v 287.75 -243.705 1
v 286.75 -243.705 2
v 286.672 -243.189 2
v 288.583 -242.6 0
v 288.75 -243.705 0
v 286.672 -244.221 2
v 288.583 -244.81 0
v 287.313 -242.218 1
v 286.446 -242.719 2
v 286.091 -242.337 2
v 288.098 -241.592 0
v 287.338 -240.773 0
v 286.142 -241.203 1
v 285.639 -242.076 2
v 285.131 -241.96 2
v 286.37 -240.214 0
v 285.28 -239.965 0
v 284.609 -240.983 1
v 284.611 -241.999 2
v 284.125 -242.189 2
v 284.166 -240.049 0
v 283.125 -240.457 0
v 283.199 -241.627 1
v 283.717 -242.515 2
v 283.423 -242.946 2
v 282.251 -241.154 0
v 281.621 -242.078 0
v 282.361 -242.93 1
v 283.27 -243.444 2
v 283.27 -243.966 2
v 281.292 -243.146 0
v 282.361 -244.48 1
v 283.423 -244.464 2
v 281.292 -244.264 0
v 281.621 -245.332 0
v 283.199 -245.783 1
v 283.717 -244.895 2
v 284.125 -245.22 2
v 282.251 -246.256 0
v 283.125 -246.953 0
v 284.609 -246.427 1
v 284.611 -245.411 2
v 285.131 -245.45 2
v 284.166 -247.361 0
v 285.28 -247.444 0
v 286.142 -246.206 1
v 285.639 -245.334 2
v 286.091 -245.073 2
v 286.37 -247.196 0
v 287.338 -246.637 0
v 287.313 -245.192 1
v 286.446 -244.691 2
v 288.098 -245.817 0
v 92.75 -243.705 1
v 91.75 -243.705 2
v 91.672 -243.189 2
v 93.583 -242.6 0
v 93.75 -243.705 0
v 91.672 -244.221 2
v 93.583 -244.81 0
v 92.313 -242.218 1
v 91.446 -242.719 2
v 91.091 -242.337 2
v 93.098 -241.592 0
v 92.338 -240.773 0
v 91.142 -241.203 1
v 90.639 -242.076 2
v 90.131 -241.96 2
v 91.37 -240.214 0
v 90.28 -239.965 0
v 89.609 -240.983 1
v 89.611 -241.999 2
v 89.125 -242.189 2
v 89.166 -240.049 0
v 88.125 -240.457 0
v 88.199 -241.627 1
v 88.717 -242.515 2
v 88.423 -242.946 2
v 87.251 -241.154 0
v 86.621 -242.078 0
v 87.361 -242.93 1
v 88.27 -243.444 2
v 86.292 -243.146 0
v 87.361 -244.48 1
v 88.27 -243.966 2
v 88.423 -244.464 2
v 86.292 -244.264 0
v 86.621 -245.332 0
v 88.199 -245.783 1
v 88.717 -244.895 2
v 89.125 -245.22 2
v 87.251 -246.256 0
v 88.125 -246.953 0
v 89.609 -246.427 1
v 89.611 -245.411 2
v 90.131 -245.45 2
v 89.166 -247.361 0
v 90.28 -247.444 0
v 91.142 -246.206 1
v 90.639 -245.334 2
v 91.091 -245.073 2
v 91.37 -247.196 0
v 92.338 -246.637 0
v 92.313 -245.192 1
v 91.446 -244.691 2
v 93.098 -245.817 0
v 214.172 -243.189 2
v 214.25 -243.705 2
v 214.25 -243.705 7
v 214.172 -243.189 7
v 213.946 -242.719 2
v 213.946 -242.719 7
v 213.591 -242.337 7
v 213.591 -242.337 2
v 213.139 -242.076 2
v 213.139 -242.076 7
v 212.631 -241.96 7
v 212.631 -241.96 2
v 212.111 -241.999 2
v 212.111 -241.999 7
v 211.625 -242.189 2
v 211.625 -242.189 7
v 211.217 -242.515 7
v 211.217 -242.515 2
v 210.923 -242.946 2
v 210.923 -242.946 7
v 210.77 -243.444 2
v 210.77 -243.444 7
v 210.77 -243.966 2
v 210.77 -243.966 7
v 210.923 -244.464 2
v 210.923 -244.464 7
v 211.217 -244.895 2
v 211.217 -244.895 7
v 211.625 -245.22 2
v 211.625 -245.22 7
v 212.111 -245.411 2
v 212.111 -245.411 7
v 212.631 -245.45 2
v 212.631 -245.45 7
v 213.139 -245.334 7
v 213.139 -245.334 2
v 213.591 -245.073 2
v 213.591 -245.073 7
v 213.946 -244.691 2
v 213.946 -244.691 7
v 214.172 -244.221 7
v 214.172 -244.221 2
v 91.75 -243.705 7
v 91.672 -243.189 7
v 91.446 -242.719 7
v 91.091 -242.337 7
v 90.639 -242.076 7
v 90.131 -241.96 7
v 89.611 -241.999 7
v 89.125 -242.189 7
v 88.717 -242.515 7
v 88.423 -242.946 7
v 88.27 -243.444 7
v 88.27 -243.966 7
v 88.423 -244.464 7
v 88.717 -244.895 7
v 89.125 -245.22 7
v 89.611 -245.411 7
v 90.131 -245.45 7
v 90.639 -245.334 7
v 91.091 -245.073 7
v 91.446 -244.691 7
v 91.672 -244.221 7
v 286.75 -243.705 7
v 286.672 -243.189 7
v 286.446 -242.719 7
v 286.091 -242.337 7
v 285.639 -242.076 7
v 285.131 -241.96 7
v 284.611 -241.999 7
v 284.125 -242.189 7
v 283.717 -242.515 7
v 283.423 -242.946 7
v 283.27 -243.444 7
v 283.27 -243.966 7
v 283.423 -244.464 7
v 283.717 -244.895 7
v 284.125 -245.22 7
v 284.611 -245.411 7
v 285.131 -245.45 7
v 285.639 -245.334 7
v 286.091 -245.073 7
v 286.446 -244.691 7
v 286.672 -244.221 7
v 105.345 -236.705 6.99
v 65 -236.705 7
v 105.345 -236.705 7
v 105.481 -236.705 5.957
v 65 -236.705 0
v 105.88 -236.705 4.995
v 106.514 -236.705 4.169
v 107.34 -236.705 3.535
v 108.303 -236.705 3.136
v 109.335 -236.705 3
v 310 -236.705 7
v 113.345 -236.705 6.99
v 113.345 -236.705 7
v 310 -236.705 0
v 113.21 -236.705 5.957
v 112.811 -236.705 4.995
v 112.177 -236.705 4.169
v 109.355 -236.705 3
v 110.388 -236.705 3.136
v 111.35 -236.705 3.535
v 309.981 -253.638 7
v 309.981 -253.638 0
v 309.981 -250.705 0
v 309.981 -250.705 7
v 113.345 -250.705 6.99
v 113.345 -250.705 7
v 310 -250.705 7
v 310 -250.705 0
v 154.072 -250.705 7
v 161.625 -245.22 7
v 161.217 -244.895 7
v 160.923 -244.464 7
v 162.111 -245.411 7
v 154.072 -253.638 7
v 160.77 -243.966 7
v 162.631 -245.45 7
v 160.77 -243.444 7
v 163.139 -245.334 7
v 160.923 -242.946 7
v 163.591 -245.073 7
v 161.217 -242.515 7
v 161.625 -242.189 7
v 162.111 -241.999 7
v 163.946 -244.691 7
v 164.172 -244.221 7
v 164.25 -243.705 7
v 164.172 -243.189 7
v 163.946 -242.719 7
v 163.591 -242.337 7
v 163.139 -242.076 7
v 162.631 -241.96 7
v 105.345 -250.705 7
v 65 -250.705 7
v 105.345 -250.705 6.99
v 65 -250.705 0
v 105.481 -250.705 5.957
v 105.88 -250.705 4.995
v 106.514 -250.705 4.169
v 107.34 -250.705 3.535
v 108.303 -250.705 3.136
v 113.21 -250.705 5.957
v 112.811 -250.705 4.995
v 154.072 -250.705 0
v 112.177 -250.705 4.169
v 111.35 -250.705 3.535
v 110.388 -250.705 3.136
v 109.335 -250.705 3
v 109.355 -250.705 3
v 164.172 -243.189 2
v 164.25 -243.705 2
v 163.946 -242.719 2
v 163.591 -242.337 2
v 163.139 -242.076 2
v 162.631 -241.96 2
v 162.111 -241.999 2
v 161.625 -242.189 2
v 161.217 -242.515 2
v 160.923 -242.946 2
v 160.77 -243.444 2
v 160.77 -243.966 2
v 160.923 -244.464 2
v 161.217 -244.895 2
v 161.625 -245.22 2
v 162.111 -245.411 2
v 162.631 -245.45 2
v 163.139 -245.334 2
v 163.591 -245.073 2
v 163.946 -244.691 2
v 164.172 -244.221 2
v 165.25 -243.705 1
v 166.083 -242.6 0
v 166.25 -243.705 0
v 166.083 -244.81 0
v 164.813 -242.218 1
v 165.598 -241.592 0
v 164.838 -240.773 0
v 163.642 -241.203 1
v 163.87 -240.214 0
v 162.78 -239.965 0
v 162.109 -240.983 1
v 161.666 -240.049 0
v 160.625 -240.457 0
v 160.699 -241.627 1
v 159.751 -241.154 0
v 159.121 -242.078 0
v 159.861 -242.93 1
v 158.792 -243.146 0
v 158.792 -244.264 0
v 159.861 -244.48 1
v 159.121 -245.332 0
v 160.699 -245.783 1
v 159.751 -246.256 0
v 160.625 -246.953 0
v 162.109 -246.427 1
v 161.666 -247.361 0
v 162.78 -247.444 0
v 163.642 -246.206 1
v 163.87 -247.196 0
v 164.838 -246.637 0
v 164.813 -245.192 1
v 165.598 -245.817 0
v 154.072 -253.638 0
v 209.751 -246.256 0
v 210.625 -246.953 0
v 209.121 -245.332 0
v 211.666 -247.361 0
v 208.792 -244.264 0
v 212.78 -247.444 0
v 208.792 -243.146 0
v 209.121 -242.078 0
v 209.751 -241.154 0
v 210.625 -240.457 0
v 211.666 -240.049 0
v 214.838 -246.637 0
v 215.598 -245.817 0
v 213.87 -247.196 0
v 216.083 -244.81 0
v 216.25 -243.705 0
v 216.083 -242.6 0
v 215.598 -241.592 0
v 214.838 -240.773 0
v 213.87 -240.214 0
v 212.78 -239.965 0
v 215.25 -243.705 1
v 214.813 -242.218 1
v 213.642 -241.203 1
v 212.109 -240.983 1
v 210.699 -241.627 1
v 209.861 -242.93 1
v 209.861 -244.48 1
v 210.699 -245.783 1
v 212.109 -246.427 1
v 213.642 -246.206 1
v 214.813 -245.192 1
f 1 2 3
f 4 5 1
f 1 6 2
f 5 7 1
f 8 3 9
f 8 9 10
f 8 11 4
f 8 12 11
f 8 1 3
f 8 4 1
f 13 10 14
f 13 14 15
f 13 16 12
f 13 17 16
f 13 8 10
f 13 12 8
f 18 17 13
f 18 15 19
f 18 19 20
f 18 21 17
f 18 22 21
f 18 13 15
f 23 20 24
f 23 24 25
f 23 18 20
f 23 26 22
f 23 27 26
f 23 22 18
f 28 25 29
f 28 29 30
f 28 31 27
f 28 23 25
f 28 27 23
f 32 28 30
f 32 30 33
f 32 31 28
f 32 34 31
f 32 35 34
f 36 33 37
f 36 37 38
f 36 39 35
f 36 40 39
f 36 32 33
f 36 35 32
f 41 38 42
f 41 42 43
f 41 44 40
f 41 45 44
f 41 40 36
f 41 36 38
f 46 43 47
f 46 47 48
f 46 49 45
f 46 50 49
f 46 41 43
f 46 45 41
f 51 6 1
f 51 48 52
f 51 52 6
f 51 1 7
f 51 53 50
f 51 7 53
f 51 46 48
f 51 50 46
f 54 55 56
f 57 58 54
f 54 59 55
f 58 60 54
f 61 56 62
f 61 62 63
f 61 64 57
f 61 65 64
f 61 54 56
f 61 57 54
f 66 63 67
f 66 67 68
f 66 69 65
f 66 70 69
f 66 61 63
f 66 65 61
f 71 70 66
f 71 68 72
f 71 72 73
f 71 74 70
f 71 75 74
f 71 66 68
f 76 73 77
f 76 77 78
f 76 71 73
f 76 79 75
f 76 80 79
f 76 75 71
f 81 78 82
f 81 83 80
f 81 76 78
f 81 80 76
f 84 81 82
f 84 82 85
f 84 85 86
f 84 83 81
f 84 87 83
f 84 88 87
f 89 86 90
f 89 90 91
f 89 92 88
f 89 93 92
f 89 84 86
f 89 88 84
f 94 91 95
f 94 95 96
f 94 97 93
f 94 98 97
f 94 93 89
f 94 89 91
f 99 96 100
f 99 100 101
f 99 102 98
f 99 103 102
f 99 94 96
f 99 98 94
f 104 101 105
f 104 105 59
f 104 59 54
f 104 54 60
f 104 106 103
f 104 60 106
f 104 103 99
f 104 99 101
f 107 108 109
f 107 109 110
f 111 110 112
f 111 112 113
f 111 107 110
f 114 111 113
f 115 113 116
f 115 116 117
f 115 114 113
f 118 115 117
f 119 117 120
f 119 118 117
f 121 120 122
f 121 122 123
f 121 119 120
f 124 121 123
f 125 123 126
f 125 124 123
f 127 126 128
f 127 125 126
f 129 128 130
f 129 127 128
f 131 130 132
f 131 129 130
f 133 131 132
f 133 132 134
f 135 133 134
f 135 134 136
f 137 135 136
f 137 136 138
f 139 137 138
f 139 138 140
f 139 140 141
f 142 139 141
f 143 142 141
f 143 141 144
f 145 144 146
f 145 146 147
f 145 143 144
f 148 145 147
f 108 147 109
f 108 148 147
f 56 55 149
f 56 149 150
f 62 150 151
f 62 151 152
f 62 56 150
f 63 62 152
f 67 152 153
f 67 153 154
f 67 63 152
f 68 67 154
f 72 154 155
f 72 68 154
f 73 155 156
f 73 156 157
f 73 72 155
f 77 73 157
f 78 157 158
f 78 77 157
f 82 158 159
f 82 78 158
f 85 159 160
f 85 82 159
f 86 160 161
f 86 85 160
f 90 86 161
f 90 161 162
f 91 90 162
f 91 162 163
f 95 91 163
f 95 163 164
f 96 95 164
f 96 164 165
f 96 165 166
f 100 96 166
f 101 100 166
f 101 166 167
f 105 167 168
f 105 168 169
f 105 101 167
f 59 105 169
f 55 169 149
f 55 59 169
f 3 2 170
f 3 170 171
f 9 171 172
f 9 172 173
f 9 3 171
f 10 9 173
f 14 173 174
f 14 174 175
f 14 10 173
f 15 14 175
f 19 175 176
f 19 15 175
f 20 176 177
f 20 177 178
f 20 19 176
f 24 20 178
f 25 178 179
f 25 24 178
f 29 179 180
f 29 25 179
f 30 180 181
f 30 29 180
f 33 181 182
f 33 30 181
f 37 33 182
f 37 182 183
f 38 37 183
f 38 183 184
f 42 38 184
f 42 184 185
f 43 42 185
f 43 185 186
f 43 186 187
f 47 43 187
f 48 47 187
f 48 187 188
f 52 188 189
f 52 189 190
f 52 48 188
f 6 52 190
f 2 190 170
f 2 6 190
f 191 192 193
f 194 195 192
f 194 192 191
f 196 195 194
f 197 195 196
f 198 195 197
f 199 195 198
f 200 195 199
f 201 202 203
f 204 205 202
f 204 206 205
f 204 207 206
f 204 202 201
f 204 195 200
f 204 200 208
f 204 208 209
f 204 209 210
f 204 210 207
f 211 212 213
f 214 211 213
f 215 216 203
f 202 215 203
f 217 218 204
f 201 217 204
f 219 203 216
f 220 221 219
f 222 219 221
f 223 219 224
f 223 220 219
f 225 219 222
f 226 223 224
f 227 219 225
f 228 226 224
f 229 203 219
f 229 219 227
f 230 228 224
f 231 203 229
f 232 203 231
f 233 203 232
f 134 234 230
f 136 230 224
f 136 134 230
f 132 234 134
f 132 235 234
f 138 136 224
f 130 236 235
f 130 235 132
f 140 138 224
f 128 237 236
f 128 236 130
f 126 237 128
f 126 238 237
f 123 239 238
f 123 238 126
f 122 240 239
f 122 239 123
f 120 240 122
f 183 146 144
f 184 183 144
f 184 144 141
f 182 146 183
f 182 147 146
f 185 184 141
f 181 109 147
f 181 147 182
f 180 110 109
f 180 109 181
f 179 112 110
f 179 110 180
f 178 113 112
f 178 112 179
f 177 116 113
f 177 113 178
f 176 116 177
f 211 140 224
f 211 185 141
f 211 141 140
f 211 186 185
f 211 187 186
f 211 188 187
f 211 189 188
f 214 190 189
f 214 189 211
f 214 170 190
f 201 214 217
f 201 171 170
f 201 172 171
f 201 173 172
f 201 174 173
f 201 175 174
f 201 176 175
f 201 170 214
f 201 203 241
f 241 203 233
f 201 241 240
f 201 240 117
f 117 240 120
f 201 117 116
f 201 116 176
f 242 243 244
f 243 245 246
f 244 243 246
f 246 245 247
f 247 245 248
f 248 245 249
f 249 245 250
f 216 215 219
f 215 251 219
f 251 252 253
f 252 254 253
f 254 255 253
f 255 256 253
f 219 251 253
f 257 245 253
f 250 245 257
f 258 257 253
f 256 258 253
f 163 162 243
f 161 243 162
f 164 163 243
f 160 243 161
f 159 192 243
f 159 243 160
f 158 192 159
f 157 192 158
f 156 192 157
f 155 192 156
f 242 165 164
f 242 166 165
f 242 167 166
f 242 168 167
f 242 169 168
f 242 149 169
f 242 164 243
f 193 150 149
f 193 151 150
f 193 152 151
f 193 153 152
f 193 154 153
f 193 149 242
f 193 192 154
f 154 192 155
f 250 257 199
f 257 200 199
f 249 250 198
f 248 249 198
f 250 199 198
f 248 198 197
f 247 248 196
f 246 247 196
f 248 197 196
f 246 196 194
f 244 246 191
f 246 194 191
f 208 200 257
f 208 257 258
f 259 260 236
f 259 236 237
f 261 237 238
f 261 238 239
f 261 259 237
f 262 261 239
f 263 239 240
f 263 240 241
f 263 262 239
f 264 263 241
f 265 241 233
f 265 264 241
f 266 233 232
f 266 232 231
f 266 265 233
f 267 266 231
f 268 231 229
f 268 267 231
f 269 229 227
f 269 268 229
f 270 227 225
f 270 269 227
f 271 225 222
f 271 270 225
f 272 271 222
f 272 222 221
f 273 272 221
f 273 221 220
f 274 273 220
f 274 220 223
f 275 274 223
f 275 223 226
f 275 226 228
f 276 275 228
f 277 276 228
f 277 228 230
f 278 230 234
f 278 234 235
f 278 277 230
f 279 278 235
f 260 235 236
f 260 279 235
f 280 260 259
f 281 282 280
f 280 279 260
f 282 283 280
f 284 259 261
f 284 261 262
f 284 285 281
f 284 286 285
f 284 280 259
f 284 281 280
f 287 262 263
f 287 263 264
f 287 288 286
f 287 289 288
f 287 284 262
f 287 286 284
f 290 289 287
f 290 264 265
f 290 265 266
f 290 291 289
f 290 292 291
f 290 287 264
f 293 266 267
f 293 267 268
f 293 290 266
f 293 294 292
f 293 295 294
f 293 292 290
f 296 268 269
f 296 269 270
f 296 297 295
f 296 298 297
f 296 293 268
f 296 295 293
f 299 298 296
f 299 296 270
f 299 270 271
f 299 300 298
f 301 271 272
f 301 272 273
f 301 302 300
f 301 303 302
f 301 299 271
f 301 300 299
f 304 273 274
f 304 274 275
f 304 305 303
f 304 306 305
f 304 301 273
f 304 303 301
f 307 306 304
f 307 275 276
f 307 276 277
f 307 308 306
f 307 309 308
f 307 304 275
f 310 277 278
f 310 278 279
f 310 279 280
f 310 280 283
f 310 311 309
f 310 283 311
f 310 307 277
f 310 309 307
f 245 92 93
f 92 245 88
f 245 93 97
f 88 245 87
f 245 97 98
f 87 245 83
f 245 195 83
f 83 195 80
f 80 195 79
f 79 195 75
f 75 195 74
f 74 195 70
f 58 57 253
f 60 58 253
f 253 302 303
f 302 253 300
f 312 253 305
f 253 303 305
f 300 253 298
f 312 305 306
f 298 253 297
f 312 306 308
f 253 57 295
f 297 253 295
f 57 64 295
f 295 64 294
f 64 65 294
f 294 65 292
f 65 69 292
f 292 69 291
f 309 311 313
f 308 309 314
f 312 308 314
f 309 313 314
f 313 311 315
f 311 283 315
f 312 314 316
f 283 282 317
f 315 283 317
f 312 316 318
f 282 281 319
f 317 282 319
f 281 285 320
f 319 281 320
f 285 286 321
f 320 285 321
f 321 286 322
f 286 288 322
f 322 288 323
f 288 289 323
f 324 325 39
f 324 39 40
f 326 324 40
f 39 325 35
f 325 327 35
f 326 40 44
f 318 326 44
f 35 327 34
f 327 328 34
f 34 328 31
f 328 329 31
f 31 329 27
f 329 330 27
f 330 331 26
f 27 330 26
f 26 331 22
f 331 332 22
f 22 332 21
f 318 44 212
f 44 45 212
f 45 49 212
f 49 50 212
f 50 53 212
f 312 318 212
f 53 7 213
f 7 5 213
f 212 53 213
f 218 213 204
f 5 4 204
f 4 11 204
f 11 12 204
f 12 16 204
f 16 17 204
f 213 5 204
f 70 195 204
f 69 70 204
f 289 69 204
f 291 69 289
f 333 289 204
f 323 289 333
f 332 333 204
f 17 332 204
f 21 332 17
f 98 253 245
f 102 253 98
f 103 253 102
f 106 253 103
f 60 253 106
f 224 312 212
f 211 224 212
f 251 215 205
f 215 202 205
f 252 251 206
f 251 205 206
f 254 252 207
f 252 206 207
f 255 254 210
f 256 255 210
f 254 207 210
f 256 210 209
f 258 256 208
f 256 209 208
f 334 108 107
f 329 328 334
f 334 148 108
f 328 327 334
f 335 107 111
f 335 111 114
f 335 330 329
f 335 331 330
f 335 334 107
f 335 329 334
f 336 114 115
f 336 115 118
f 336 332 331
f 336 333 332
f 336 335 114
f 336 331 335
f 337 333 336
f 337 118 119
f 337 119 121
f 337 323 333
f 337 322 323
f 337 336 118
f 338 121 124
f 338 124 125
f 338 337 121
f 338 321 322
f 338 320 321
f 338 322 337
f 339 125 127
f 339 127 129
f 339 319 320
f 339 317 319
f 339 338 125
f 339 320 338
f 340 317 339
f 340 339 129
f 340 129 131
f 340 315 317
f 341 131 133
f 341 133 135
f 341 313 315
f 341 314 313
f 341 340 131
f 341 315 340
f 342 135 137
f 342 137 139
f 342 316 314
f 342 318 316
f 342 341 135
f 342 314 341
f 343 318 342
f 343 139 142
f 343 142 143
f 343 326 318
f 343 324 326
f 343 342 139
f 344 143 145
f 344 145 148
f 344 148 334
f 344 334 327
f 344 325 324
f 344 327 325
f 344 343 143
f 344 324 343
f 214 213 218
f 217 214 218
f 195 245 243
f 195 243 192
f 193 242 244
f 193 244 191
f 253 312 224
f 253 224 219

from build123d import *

# Parameters (mm, degrees)
SKETCH085_W     = 245
SKETCH085_H     = 14
SKETCH085_R     = 1.75
PAD043_DEPTH    = 7
CHAMFER010_SIZE = 2
SKETCH086_W     = 155.909408
SKETCH086_H     = 3
PAD044_DEPTH    = 7
SKETCH097_W     = 8
SKETCH097_H     = 22
POCKET043_DEPTH = 4
FILLET003_R     = 3.99


with BuildPart() as part:
    # Sketch085 → Pad043 (new body)
    with BuildSketch(Plane.XY):
        with Locations((187.5, -243.704939)):
            Rectangle(SKETCH085_W, SKETCH085_H)
        with Locations((162.5, -243.704939)):
            Circle(SKETCH085_R, mode=Mode.SUBTRACT)
        with Locations((90, -243.704939)):
            Circle(SKETCH085_R, mode=Mode.SUBTRACT)
        with Locations((212.5, -243.704939)):
            Circle(SKETCH085_R, mode=Mode.SUBTRACT)
        with Locations((285, -243.704939)):
            Circle(SKETCH085_R, mode=Mode.SUBTRACT)
    extrude(amount=PAD043_DEPTH)

    # Chamfer010
    chamfer010_edges = [part.edges().sort_by_distance(p)[0] for p in [
        (283.25, -243.704939, 0),
        (210.75, -243.704939, 0),
        (160.75, -243.704939, 0),
        (88.25, -243.704939, 0),
    ]]
    chamfer(chamfer010_edges, length=CHAMFER010_SIZE)

    # Sketch086 → Pad044 (join)
    with BuildSketch(Plane.XY):
        with Locations((232.026436, -252.13768)):
            Rectangle(SKETCH086_W, SKETCH086_H)
    extrude(amount=PAD044_DEPTH)

    # Sketch097 (on DatumPlane) → Pocket043 (cut)
    with BuildSketch(Plane.XY.offset(7)):
        with Locations((109.345456, -244.63761)):
            Rectangle(SKETCH097_W, SKETCH097_H)
    extrude(amount=-POCKET043_DEPTH, mode=Mode.SUBTRACT)

    # Fillet003
    fillet003_edges = [part.edges().sort_by_distance(p)[0] for p in [
        (113.345456, -243.704939, 3),
        (105.345456, -243.704939, 3),
    ]]
    fillet(fillet003_edges, radius=FILLET003_R)


solid = part.part
